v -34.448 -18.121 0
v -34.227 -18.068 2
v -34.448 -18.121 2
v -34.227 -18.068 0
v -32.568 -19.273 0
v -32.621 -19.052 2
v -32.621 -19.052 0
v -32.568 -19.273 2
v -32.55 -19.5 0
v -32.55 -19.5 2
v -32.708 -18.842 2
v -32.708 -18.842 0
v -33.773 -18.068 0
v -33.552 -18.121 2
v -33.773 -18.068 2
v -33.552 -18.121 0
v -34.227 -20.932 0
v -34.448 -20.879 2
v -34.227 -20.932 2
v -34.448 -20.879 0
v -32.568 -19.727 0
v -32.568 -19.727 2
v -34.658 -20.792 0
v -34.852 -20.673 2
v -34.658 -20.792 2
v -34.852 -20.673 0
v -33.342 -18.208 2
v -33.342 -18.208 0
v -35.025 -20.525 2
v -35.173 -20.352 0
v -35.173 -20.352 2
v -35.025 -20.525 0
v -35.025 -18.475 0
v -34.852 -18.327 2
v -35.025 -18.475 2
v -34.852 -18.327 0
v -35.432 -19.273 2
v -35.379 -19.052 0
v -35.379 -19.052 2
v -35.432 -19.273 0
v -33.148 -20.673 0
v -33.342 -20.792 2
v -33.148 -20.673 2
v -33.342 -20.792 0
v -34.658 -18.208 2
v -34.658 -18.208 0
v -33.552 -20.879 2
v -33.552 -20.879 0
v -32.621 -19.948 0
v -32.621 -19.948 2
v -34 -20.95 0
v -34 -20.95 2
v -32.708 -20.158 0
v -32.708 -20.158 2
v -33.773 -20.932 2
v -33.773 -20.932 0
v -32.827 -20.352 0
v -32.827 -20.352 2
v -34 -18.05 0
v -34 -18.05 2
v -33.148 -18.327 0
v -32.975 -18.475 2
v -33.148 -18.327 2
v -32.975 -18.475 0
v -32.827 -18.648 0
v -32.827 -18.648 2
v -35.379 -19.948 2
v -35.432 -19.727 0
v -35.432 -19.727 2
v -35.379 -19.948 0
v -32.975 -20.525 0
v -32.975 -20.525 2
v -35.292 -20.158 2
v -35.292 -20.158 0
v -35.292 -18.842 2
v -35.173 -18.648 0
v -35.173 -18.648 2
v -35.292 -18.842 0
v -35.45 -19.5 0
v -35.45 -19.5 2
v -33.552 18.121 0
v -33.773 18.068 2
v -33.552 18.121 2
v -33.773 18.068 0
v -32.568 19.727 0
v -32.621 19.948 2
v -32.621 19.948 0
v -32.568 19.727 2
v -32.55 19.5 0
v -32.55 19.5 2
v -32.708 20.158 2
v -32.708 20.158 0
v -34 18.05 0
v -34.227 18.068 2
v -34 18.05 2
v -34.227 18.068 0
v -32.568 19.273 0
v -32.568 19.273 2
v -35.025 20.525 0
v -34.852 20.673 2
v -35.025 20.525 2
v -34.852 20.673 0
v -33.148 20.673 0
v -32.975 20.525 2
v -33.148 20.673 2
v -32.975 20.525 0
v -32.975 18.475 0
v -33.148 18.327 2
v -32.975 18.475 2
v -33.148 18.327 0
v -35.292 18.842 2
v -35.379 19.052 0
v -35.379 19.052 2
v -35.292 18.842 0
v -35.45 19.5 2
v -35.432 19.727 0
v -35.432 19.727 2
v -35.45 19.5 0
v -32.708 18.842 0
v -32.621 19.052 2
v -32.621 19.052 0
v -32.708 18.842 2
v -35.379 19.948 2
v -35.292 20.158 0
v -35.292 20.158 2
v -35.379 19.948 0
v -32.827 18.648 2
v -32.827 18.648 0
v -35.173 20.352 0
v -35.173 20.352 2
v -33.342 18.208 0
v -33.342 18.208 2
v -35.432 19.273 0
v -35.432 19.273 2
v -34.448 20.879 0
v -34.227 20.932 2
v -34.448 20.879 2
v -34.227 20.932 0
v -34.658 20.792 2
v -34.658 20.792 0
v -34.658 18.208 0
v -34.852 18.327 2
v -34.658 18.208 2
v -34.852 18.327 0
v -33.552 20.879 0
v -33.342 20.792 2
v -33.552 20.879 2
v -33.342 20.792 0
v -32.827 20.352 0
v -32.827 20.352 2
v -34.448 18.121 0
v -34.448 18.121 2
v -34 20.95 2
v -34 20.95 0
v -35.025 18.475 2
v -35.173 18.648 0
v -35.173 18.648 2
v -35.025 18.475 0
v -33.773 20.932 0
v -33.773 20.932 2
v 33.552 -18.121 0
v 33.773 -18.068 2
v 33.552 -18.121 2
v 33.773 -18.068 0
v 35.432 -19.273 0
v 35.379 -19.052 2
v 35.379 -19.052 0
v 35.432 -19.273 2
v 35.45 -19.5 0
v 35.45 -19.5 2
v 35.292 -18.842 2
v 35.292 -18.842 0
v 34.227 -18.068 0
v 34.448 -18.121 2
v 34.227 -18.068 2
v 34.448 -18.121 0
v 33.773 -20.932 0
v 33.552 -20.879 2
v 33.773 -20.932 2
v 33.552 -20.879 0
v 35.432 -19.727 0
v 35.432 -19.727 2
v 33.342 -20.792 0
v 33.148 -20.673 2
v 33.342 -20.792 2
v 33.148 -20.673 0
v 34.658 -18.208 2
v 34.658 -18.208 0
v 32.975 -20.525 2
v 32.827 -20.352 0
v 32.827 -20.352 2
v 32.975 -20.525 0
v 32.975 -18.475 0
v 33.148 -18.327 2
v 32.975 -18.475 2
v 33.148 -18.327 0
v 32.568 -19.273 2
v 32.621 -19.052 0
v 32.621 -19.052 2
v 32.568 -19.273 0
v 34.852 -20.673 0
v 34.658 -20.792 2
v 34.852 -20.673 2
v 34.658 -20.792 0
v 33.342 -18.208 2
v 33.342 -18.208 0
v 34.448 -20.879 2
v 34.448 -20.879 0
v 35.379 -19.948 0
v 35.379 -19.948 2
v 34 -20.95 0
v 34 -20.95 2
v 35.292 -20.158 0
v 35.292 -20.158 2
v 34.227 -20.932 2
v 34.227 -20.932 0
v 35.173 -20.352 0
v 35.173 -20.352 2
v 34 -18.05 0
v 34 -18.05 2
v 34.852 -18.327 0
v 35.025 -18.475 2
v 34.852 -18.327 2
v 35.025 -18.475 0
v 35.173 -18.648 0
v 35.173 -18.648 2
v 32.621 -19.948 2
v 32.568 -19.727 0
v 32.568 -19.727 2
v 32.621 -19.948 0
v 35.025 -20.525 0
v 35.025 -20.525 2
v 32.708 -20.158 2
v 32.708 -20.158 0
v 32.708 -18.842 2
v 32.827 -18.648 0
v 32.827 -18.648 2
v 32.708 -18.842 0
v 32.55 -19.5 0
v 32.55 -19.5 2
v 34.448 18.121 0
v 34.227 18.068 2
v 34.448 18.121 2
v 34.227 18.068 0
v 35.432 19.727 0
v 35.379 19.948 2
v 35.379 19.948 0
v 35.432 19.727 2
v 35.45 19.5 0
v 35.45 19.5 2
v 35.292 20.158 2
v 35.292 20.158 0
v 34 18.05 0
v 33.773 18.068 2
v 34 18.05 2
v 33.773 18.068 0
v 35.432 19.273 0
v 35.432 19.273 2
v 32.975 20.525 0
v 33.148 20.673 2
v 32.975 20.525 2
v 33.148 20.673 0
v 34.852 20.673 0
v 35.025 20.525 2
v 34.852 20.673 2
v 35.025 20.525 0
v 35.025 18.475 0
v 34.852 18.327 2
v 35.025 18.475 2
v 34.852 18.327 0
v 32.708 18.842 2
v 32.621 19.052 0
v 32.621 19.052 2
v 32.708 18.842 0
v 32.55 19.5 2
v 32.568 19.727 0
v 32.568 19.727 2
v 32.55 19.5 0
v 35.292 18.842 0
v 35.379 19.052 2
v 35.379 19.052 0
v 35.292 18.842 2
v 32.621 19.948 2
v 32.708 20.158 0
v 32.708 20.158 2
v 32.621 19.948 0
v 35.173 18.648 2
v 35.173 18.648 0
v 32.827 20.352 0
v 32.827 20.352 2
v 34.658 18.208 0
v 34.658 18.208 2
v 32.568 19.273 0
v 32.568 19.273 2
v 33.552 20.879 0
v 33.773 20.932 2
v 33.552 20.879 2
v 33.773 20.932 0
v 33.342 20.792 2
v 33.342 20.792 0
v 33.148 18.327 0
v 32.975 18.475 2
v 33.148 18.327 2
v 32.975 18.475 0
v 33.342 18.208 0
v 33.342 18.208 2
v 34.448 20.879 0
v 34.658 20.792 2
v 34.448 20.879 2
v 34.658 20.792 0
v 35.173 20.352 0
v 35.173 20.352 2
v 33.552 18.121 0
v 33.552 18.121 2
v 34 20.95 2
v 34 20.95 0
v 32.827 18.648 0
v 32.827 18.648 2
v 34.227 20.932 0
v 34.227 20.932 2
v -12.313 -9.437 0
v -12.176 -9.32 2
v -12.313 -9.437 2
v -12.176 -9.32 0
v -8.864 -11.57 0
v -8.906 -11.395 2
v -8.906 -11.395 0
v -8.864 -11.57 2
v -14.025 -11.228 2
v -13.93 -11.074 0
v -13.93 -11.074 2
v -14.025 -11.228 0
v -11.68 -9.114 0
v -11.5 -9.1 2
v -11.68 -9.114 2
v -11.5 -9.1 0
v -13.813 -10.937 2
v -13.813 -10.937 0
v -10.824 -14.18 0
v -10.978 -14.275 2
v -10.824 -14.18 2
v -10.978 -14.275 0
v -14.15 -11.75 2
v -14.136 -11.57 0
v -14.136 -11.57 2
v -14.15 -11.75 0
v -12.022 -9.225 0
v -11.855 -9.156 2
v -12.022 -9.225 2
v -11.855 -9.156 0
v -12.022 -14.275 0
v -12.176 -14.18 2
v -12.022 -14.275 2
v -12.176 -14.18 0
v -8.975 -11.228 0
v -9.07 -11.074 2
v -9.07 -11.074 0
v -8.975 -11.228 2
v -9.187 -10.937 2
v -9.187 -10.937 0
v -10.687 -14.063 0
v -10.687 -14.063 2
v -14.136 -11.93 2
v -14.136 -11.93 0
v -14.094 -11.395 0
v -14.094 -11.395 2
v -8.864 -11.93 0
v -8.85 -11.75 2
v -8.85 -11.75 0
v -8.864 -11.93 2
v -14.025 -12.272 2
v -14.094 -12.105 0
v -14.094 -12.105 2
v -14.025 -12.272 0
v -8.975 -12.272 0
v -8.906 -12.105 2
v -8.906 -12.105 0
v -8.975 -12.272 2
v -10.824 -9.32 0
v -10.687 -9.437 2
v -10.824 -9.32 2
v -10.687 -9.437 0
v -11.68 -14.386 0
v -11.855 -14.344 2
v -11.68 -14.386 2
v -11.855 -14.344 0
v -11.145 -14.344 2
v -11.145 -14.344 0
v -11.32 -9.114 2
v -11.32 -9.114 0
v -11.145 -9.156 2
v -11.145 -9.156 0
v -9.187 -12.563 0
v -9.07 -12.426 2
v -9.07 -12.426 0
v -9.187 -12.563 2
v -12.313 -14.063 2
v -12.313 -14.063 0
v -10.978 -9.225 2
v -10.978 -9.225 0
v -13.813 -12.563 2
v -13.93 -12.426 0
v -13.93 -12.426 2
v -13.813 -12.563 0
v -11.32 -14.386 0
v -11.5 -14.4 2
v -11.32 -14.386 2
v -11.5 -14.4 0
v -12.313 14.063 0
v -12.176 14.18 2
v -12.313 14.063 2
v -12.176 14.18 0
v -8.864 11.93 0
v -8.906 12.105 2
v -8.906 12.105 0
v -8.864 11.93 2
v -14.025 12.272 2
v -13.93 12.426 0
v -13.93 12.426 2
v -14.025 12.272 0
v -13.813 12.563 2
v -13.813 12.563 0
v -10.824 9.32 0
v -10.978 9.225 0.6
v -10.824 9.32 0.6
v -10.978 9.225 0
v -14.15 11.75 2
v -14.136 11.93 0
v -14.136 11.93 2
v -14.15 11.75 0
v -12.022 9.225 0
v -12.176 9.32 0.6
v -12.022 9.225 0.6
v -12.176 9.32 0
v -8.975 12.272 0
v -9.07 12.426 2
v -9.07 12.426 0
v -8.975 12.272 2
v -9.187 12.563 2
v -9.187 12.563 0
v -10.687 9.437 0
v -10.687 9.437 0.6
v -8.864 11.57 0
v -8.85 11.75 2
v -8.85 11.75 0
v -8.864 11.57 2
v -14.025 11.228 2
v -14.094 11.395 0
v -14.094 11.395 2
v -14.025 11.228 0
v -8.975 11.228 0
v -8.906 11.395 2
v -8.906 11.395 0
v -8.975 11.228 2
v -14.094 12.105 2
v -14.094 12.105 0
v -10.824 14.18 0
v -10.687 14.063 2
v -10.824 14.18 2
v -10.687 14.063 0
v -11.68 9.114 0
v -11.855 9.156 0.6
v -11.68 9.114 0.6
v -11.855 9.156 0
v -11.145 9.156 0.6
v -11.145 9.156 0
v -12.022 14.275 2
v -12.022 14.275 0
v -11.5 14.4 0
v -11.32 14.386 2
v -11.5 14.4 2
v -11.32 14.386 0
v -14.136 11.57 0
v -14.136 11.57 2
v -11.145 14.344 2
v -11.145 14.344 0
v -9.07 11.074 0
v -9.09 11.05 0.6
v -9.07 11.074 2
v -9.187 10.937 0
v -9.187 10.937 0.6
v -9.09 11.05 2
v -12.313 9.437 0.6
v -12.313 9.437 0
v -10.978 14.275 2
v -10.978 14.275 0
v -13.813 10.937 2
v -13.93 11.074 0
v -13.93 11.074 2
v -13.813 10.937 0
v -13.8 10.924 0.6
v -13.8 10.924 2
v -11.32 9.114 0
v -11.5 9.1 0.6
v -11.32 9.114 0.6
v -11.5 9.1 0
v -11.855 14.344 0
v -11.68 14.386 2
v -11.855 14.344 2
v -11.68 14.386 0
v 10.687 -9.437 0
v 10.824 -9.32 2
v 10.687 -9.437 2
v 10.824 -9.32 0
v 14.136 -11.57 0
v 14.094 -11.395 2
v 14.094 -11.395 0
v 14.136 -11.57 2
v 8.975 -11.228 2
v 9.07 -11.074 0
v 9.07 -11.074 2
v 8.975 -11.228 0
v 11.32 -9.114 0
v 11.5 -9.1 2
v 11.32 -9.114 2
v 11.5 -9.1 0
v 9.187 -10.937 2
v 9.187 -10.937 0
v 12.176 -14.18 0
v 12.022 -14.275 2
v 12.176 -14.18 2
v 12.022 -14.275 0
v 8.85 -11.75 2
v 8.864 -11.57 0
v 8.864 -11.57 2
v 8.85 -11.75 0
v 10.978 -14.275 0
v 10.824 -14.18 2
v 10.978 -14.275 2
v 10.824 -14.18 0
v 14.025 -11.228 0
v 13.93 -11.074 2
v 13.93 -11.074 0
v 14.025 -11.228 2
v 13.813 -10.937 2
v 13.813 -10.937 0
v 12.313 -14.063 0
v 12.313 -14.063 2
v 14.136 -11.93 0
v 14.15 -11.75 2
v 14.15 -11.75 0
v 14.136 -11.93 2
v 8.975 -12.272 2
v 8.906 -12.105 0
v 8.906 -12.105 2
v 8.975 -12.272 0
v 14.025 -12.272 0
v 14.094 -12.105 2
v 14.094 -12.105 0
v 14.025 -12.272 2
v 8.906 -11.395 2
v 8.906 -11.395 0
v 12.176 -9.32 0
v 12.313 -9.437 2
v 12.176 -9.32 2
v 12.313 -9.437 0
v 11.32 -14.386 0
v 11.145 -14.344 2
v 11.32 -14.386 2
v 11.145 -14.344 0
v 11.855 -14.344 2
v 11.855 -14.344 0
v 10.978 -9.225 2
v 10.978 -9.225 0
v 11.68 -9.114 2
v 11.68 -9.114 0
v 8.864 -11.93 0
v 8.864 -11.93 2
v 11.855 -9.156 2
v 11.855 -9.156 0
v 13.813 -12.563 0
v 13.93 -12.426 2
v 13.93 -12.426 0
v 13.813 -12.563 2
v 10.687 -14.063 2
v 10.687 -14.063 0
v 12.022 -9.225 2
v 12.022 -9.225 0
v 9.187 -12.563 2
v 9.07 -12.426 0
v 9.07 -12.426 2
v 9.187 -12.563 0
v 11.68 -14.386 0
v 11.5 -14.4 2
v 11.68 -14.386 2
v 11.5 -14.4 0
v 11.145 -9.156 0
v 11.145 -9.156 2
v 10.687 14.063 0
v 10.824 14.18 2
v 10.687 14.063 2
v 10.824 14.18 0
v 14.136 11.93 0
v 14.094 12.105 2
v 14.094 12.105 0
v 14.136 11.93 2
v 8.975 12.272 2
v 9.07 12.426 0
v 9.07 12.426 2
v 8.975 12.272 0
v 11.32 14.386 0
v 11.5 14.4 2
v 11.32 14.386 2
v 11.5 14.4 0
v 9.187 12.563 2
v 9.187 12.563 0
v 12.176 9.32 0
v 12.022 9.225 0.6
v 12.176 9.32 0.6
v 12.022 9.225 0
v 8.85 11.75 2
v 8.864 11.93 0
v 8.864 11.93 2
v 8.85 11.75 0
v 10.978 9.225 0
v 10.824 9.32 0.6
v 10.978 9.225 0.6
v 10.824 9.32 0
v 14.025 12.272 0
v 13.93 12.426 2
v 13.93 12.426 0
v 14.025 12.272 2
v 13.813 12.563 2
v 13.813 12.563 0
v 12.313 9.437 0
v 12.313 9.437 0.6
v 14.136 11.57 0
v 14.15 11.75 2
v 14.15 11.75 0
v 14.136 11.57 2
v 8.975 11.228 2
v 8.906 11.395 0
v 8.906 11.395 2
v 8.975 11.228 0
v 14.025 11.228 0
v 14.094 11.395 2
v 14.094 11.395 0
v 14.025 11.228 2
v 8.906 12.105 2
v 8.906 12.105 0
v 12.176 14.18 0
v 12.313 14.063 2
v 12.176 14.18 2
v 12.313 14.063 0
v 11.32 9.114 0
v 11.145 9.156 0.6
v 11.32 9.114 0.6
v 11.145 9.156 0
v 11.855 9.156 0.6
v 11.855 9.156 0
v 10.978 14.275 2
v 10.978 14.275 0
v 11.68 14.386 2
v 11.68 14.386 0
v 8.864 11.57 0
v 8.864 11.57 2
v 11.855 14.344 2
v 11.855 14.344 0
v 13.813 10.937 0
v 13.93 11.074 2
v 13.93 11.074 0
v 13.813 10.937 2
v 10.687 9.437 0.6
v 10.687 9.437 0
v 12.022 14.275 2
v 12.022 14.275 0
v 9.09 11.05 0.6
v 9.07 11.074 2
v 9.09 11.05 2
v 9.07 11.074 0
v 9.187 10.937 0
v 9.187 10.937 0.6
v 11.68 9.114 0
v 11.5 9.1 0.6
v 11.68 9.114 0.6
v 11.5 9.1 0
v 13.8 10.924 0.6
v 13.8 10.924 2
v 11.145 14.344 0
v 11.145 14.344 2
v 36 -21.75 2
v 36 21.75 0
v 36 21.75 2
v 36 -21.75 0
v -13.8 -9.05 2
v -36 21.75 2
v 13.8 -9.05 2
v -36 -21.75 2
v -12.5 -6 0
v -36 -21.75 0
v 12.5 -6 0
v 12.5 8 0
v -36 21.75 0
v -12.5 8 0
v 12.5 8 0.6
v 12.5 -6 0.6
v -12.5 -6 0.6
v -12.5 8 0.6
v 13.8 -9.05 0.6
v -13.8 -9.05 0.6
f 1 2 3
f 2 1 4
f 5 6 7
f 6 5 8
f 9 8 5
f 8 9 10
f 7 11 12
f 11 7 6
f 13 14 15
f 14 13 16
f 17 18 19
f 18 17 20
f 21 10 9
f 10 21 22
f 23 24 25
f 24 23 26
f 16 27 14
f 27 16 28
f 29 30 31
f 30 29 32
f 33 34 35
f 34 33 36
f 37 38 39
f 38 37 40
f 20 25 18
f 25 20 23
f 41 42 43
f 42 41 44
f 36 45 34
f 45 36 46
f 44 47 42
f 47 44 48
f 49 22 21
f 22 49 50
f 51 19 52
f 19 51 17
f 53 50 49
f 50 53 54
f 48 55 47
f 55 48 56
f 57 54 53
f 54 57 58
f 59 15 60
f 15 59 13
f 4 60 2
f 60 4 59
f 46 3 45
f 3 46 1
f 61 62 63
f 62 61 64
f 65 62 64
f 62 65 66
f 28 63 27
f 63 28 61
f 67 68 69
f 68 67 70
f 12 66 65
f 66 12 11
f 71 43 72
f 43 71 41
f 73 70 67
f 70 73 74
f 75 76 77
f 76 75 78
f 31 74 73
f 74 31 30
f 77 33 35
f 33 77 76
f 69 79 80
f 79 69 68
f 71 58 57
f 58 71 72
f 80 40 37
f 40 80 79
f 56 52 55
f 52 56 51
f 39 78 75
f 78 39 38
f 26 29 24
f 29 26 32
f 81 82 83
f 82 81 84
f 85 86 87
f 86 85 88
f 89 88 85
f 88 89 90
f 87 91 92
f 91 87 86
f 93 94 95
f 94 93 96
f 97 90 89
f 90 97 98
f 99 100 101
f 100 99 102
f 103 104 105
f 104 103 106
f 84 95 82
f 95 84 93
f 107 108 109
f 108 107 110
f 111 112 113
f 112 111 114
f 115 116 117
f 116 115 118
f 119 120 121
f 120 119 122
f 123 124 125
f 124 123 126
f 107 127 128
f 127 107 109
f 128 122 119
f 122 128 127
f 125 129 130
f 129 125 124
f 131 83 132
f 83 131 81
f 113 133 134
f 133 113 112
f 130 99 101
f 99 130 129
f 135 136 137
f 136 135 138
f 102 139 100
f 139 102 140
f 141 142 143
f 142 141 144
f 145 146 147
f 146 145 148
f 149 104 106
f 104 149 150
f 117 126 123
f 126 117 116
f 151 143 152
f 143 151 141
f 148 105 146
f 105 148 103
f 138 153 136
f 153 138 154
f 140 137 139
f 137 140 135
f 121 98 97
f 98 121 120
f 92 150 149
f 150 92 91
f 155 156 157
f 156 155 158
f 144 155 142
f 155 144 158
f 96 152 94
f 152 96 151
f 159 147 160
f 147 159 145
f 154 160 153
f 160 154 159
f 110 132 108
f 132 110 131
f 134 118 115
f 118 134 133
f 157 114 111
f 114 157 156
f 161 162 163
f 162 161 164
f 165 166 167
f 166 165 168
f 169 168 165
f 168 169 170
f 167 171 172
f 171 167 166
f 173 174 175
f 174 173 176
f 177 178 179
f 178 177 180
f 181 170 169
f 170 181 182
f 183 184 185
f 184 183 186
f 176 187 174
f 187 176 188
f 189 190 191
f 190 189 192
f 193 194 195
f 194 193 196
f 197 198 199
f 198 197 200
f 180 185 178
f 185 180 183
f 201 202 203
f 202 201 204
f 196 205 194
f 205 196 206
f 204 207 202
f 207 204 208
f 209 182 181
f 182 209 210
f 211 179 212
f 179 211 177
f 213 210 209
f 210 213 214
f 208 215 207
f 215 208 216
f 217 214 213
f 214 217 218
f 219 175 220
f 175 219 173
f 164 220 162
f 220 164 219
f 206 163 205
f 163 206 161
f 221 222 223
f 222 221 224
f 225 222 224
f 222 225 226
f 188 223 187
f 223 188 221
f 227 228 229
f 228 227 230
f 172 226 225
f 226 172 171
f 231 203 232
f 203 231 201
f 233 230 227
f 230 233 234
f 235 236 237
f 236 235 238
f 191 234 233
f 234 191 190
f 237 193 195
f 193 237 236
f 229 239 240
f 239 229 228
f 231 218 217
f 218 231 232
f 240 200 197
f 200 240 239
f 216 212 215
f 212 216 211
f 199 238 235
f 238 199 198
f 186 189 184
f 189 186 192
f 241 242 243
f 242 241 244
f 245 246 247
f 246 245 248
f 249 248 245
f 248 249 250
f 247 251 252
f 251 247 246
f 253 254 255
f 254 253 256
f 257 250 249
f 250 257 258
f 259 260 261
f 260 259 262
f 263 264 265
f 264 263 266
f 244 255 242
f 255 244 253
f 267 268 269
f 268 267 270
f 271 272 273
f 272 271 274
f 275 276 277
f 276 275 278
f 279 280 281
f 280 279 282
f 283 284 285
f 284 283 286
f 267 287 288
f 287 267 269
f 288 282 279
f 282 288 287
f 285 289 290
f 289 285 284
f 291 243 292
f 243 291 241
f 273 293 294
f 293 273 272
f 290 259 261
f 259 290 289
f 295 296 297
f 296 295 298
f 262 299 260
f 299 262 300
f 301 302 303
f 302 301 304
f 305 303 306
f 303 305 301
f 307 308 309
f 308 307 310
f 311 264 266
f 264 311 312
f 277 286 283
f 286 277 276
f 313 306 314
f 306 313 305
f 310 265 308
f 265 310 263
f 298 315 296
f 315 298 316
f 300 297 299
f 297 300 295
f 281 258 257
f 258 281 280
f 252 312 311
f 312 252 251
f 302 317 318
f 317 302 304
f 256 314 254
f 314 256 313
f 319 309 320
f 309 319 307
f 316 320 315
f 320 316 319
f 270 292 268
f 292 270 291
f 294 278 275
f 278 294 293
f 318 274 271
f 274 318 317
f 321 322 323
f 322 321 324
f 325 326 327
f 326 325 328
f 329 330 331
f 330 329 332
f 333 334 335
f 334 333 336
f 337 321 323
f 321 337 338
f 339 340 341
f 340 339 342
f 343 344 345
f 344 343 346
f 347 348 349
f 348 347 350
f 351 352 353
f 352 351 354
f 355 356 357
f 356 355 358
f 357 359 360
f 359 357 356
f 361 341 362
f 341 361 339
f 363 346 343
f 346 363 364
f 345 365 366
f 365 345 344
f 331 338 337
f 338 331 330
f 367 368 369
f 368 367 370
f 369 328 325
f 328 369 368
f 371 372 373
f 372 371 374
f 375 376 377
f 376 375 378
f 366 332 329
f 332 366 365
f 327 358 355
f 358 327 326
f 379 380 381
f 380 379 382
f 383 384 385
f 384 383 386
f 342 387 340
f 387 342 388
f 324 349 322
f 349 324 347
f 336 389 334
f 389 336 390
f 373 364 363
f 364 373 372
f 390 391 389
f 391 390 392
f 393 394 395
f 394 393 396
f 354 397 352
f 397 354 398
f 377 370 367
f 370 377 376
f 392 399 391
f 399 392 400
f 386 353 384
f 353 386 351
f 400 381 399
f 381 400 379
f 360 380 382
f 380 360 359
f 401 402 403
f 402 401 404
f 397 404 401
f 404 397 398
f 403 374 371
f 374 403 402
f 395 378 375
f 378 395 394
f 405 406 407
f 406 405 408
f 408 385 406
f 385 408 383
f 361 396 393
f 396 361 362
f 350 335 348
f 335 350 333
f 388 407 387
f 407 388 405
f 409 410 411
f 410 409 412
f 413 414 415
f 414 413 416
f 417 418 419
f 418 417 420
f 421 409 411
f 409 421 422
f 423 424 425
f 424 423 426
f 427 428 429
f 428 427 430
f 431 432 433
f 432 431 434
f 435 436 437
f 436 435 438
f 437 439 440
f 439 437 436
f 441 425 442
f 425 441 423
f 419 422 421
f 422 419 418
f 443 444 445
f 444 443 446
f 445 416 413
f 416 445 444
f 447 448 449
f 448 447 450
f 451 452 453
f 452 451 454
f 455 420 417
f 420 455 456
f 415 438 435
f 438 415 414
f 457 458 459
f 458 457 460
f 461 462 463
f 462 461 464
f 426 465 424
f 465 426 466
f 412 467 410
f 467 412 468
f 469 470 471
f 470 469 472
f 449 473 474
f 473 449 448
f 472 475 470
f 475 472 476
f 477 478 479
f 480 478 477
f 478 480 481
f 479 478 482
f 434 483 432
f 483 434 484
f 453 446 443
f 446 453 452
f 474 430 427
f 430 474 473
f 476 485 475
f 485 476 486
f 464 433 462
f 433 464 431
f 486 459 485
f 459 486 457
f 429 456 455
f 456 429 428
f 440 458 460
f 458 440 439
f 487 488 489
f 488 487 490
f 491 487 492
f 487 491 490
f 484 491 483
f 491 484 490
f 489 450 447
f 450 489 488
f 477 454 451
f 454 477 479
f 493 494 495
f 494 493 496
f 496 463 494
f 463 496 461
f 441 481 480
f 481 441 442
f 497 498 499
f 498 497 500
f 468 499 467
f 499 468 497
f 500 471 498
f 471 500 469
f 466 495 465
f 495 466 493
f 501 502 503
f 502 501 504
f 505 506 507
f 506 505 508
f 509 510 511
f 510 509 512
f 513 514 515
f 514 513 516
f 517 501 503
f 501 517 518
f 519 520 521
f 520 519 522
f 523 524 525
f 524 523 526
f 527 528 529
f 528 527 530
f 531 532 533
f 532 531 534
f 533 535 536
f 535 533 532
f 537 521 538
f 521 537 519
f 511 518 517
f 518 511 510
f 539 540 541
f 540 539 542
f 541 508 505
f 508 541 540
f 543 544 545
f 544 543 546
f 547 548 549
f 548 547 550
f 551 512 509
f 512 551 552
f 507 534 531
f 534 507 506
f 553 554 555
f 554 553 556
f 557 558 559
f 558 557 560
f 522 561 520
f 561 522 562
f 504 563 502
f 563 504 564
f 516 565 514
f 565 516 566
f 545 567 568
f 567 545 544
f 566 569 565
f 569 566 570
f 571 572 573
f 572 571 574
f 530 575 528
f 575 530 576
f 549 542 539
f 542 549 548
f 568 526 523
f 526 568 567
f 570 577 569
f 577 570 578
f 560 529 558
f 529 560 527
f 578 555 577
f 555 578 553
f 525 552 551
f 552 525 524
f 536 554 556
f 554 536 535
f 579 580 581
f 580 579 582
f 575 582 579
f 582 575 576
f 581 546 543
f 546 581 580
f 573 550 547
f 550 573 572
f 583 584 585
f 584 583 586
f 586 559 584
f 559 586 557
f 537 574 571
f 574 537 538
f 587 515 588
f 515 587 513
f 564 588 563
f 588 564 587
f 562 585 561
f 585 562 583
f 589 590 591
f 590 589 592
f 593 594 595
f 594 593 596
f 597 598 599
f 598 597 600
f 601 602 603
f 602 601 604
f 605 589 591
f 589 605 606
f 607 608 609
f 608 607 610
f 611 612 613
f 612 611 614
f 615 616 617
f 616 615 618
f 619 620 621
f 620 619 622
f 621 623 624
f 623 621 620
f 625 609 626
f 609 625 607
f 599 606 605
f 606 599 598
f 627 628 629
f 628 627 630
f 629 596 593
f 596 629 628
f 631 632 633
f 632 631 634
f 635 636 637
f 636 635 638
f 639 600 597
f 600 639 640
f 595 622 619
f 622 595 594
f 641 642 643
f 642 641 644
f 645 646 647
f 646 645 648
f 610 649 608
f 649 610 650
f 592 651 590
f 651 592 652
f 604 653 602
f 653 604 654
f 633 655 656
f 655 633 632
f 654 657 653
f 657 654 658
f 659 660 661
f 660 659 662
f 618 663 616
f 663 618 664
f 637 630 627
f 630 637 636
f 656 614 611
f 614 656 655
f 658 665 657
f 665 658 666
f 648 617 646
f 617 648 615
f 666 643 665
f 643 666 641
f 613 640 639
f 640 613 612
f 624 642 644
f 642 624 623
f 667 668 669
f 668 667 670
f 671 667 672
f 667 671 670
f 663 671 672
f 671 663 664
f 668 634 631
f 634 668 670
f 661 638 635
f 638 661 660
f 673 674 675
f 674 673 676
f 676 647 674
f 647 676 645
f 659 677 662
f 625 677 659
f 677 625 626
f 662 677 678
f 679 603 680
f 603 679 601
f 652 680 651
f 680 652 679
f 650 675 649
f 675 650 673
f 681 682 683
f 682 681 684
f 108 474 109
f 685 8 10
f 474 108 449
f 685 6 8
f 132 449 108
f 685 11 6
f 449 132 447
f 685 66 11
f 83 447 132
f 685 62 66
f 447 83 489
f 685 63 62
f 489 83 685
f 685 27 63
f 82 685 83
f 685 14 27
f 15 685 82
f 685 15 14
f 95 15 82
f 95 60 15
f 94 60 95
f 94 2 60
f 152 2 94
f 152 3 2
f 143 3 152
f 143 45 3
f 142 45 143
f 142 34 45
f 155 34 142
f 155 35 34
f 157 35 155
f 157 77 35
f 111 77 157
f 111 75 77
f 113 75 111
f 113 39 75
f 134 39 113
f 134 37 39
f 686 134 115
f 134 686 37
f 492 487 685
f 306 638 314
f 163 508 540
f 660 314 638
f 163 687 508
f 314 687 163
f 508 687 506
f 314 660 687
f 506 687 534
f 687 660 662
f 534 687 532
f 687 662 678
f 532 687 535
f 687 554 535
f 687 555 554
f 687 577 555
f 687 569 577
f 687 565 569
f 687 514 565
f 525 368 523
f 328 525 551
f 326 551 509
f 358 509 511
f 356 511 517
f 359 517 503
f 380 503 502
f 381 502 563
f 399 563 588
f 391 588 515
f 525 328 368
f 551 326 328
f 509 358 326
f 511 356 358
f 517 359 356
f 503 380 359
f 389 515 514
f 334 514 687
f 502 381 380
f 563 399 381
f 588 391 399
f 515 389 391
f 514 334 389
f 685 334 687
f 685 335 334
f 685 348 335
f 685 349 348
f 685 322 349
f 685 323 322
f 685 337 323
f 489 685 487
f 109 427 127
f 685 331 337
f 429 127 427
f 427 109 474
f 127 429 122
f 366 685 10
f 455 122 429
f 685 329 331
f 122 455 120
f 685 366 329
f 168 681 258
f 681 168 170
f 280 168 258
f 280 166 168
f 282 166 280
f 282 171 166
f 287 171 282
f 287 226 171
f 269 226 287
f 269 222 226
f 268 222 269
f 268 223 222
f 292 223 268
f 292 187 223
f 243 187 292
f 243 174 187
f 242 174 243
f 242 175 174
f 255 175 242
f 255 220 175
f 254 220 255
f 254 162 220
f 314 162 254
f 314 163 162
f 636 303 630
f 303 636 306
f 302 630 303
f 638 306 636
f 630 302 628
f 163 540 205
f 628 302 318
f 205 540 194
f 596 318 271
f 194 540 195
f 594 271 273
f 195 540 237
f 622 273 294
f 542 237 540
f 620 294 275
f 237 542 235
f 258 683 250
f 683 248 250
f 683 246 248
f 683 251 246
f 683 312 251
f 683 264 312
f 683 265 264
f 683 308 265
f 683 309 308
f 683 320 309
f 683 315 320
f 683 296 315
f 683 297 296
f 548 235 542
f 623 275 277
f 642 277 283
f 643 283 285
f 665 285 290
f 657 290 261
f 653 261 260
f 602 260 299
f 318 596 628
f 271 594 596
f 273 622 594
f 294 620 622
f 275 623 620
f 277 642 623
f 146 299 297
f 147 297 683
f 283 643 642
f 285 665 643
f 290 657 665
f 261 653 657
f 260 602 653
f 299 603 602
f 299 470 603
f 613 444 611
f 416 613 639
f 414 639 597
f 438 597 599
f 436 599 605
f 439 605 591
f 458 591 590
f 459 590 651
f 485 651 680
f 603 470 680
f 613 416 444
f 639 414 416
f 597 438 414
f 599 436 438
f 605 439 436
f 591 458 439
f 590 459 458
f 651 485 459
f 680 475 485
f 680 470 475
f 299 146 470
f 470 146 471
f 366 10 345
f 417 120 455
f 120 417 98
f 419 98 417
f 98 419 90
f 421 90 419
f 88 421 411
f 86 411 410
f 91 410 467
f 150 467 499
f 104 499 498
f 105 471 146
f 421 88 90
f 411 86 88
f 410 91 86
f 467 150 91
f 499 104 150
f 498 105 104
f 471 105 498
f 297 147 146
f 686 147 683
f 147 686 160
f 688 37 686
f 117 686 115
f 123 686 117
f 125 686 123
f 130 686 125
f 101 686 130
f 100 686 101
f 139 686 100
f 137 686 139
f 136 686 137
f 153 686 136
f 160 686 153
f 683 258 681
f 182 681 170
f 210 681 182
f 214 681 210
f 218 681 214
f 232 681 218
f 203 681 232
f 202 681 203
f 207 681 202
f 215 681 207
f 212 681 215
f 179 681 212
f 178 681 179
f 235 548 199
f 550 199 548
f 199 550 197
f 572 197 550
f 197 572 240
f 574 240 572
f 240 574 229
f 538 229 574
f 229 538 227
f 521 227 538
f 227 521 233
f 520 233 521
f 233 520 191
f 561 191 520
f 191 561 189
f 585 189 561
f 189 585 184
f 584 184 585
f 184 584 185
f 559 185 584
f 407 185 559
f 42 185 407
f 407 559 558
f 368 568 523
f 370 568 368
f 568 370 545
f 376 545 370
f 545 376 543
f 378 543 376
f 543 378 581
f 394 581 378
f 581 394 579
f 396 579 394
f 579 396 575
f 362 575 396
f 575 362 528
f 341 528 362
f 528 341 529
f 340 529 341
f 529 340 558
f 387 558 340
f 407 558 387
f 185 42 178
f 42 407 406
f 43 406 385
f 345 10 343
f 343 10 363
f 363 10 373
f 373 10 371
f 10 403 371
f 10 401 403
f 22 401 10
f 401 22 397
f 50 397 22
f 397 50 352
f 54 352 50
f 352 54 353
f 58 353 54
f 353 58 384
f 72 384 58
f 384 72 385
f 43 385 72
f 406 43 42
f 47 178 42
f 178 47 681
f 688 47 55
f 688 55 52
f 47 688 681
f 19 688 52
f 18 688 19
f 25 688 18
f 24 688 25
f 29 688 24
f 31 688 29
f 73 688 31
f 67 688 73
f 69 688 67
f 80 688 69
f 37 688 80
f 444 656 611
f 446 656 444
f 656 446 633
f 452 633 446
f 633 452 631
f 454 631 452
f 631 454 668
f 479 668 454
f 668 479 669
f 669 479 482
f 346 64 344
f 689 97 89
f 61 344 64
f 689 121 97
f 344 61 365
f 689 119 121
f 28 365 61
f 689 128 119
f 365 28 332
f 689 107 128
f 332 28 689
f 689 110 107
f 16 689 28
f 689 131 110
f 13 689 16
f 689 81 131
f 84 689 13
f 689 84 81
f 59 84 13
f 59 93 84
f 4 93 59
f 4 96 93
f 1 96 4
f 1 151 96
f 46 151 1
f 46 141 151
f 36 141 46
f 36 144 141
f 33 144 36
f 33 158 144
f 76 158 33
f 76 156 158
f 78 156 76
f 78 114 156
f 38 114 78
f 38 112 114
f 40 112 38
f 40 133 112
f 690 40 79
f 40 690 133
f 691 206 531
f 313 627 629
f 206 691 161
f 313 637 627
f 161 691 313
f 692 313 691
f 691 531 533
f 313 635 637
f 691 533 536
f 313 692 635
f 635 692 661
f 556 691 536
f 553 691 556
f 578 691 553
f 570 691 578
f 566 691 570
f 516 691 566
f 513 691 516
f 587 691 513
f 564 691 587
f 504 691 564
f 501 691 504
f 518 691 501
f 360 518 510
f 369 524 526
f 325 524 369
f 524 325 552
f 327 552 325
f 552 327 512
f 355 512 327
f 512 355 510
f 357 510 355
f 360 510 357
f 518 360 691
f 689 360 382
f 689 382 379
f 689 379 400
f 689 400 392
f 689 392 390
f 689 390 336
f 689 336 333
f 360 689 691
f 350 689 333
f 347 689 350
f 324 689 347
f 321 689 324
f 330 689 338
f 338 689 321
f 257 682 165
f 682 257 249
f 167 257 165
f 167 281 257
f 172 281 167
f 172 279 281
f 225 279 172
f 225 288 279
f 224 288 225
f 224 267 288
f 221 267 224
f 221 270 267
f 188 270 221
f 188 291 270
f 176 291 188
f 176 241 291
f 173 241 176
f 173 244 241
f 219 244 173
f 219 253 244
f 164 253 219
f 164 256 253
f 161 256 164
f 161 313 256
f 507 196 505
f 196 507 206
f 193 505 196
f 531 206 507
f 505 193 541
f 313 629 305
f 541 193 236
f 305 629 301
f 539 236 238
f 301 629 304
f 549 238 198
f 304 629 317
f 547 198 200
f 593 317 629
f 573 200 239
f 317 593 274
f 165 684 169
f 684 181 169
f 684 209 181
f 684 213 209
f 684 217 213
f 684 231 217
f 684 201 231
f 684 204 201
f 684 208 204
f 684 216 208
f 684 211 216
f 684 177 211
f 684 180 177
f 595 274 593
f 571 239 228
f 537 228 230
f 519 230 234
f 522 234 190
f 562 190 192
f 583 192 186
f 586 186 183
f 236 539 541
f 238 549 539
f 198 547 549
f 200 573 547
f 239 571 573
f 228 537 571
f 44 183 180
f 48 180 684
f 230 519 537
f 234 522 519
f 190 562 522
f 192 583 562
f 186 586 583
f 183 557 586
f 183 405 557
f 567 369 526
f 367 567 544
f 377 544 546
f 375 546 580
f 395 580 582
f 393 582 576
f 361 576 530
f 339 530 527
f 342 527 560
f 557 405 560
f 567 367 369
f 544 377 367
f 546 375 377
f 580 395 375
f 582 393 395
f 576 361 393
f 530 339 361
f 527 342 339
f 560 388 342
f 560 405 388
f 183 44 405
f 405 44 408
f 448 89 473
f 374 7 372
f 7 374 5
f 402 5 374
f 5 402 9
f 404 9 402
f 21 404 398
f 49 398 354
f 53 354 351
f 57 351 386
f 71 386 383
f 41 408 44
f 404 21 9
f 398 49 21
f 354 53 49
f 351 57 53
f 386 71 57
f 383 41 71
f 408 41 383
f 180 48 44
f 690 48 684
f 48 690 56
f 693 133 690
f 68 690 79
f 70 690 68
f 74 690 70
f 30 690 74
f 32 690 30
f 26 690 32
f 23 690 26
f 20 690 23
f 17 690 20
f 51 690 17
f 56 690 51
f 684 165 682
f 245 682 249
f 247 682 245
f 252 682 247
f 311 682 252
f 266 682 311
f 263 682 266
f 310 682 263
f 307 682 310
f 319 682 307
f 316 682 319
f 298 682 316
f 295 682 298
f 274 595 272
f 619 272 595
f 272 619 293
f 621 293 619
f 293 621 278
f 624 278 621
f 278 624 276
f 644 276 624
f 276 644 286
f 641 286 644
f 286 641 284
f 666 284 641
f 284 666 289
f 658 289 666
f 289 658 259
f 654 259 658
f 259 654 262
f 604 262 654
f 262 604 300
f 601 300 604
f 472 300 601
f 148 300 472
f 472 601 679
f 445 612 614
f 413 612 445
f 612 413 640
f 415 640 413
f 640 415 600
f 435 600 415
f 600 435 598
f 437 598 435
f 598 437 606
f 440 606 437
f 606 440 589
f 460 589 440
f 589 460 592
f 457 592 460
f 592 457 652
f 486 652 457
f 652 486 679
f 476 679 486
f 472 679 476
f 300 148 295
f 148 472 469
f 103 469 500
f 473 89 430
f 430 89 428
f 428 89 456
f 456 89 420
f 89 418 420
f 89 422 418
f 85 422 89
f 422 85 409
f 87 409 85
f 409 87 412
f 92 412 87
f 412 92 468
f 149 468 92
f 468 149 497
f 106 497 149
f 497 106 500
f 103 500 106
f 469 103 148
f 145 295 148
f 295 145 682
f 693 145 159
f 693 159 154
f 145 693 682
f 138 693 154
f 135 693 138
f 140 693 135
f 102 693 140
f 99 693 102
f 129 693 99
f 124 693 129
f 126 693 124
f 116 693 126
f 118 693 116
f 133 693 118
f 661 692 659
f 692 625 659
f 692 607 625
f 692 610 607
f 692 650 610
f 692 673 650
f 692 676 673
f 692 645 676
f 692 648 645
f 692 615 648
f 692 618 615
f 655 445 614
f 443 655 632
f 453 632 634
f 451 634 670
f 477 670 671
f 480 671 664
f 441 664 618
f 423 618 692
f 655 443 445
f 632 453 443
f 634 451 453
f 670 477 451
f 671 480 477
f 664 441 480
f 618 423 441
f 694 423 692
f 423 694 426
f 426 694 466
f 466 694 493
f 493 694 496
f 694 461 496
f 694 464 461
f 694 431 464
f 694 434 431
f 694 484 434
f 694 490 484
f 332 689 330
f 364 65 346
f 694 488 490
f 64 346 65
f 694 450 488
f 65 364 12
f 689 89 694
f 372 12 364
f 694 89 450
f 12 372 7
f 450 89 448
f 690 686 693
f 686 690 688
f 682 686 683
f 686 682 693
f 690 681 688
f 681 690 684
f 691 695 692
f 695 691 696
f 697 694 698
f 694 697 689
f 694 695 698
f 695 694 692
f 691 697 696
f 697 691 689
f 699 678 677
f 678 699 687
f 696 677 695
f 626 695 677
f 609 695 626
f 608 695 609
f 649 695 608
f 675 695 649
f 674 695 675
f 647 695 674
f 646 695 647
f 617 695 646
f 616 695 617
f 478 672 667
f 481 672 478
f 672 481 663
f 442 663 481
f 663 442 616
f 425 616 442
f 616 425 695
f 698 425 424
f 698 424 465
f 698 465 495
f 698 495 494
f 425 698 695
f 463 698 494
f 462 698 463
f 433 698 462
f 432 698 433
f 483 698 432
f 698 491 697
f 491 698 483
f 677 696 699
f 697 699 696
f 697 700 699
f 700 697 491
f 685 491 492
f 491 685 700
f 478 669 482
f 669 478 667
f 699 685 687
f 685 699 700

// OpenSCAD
// =====================================================================
//  WaterGuard v2.0 - Marco adaptador para OLED 0.96" (SSD1306 128x64)
//
//  La tapa ya impresa trae los postes para la OLED de 2.42" (agujeros
//  68 x 39 mm). Este marco se atornilla en esos mismos 4 postes y
//  sostiene la OLED de 0.96" centrada bajo la ventana de la tapa.
//
//  - El vidrio de la OLED entra en un rebaje por debajo del marco y
//    asoma por una ventana de 25 x 14 mm.
//  - La OLED se fija con 4 tornillos M2 (agujeros alargados porque
//    cada clon trae la separación un poco distinta) o con silicona.
//  - Imprimir en color oscuro (negro): es lo que se ve por la ventana.
//  - Se imprime tal cual (cara grabada sobre la cama), sin soportes.
//
//  Tornillería: 4x M2.5 x 6 (marco -> postes de la tapa)
//               4x M2 x 6 + tuercas, o silicona (OLED -> marco)
// =====================================================================

$fn = 40;

// Marco: mismo tamaño que la PCB de la pantalla grande
marco       = [72, 43.5];
marco_t     = 2.0;
postes_sep  = [68, 39];     // agujeros de los postes de la tapa
postes_d    = 2.9;          // pasante M2.5

// OLED 0.96" (medidas típicas; verificar con la suya)
oled_pcb    = [27.3, 27.8];
oled_holes  = [23.0, 23.5]; // separación típica de agujeros M2
oled_vidrio = [27.0, 19.5]; // vidrio completo
vidrio_t    = 1.4;          // grosor del vidrio (profundidad del rebaje)
vidrio_dy   = 1.0;          // el vidrio va un poco corrido hacia los pines
oled_activa = [25.0, 14.0]; // ventana visible (zona activa ~21.7 x 10.9)
holgura     = 0.3;


module marco_adaptador() {
    difference() {
        translate([-marco[0]/2, -marco[1]/2, 0]) cube([marco[0], marco[1], marco_t]);

        // Agujeros a los postes de la tapa
        for (sx = [-1, 1], sy = [-1, 1])
            translate([sx*postes_sep[0]/2, sy*postes_sep[1]/2, -1])
                cylinder(d = postes_d, h = marco_t + 2);

        // Ventana visible de la pantalla
        translate([0, vidrio_dy, marco_t/2])
            cube([oled_activa[0], oled_activa[1], marco_t + 2], center = true);

        // Rebaje para el vidrio (por la cara de abajo, hacia la PCB)
        translate([0, vidrio_dy, marco_t - vidrio_t/2 + 0.01])
            cube([oled_vidrio[0] + 2*holgura, oled_vidrio[1] + 2*holgura, vidrio_t + 0.02], center = true);

        // Agujeros M2 de la OLED, alargados +-1.5 mm en ambos ejes
        for (sx = [-1, 1], sy = [-1, 1])
            translate([sx*oled_holes[0]/2, sy*oled_holes[1]/2, -1])
                hull() for (d = [[-1.5, 0], [1.5, 0], [0, -1.5], [0, 1.5]])
                    translate([d[0], d[1], 0]) cylinder(d = 2.3, h = marco_t + 2);

    }
}

// Cara visible (la que queda hacia la ventana) es z = 0: va sobre la
// cama; el rebaje del vidrio queda arriba.
marco_adaptador();
